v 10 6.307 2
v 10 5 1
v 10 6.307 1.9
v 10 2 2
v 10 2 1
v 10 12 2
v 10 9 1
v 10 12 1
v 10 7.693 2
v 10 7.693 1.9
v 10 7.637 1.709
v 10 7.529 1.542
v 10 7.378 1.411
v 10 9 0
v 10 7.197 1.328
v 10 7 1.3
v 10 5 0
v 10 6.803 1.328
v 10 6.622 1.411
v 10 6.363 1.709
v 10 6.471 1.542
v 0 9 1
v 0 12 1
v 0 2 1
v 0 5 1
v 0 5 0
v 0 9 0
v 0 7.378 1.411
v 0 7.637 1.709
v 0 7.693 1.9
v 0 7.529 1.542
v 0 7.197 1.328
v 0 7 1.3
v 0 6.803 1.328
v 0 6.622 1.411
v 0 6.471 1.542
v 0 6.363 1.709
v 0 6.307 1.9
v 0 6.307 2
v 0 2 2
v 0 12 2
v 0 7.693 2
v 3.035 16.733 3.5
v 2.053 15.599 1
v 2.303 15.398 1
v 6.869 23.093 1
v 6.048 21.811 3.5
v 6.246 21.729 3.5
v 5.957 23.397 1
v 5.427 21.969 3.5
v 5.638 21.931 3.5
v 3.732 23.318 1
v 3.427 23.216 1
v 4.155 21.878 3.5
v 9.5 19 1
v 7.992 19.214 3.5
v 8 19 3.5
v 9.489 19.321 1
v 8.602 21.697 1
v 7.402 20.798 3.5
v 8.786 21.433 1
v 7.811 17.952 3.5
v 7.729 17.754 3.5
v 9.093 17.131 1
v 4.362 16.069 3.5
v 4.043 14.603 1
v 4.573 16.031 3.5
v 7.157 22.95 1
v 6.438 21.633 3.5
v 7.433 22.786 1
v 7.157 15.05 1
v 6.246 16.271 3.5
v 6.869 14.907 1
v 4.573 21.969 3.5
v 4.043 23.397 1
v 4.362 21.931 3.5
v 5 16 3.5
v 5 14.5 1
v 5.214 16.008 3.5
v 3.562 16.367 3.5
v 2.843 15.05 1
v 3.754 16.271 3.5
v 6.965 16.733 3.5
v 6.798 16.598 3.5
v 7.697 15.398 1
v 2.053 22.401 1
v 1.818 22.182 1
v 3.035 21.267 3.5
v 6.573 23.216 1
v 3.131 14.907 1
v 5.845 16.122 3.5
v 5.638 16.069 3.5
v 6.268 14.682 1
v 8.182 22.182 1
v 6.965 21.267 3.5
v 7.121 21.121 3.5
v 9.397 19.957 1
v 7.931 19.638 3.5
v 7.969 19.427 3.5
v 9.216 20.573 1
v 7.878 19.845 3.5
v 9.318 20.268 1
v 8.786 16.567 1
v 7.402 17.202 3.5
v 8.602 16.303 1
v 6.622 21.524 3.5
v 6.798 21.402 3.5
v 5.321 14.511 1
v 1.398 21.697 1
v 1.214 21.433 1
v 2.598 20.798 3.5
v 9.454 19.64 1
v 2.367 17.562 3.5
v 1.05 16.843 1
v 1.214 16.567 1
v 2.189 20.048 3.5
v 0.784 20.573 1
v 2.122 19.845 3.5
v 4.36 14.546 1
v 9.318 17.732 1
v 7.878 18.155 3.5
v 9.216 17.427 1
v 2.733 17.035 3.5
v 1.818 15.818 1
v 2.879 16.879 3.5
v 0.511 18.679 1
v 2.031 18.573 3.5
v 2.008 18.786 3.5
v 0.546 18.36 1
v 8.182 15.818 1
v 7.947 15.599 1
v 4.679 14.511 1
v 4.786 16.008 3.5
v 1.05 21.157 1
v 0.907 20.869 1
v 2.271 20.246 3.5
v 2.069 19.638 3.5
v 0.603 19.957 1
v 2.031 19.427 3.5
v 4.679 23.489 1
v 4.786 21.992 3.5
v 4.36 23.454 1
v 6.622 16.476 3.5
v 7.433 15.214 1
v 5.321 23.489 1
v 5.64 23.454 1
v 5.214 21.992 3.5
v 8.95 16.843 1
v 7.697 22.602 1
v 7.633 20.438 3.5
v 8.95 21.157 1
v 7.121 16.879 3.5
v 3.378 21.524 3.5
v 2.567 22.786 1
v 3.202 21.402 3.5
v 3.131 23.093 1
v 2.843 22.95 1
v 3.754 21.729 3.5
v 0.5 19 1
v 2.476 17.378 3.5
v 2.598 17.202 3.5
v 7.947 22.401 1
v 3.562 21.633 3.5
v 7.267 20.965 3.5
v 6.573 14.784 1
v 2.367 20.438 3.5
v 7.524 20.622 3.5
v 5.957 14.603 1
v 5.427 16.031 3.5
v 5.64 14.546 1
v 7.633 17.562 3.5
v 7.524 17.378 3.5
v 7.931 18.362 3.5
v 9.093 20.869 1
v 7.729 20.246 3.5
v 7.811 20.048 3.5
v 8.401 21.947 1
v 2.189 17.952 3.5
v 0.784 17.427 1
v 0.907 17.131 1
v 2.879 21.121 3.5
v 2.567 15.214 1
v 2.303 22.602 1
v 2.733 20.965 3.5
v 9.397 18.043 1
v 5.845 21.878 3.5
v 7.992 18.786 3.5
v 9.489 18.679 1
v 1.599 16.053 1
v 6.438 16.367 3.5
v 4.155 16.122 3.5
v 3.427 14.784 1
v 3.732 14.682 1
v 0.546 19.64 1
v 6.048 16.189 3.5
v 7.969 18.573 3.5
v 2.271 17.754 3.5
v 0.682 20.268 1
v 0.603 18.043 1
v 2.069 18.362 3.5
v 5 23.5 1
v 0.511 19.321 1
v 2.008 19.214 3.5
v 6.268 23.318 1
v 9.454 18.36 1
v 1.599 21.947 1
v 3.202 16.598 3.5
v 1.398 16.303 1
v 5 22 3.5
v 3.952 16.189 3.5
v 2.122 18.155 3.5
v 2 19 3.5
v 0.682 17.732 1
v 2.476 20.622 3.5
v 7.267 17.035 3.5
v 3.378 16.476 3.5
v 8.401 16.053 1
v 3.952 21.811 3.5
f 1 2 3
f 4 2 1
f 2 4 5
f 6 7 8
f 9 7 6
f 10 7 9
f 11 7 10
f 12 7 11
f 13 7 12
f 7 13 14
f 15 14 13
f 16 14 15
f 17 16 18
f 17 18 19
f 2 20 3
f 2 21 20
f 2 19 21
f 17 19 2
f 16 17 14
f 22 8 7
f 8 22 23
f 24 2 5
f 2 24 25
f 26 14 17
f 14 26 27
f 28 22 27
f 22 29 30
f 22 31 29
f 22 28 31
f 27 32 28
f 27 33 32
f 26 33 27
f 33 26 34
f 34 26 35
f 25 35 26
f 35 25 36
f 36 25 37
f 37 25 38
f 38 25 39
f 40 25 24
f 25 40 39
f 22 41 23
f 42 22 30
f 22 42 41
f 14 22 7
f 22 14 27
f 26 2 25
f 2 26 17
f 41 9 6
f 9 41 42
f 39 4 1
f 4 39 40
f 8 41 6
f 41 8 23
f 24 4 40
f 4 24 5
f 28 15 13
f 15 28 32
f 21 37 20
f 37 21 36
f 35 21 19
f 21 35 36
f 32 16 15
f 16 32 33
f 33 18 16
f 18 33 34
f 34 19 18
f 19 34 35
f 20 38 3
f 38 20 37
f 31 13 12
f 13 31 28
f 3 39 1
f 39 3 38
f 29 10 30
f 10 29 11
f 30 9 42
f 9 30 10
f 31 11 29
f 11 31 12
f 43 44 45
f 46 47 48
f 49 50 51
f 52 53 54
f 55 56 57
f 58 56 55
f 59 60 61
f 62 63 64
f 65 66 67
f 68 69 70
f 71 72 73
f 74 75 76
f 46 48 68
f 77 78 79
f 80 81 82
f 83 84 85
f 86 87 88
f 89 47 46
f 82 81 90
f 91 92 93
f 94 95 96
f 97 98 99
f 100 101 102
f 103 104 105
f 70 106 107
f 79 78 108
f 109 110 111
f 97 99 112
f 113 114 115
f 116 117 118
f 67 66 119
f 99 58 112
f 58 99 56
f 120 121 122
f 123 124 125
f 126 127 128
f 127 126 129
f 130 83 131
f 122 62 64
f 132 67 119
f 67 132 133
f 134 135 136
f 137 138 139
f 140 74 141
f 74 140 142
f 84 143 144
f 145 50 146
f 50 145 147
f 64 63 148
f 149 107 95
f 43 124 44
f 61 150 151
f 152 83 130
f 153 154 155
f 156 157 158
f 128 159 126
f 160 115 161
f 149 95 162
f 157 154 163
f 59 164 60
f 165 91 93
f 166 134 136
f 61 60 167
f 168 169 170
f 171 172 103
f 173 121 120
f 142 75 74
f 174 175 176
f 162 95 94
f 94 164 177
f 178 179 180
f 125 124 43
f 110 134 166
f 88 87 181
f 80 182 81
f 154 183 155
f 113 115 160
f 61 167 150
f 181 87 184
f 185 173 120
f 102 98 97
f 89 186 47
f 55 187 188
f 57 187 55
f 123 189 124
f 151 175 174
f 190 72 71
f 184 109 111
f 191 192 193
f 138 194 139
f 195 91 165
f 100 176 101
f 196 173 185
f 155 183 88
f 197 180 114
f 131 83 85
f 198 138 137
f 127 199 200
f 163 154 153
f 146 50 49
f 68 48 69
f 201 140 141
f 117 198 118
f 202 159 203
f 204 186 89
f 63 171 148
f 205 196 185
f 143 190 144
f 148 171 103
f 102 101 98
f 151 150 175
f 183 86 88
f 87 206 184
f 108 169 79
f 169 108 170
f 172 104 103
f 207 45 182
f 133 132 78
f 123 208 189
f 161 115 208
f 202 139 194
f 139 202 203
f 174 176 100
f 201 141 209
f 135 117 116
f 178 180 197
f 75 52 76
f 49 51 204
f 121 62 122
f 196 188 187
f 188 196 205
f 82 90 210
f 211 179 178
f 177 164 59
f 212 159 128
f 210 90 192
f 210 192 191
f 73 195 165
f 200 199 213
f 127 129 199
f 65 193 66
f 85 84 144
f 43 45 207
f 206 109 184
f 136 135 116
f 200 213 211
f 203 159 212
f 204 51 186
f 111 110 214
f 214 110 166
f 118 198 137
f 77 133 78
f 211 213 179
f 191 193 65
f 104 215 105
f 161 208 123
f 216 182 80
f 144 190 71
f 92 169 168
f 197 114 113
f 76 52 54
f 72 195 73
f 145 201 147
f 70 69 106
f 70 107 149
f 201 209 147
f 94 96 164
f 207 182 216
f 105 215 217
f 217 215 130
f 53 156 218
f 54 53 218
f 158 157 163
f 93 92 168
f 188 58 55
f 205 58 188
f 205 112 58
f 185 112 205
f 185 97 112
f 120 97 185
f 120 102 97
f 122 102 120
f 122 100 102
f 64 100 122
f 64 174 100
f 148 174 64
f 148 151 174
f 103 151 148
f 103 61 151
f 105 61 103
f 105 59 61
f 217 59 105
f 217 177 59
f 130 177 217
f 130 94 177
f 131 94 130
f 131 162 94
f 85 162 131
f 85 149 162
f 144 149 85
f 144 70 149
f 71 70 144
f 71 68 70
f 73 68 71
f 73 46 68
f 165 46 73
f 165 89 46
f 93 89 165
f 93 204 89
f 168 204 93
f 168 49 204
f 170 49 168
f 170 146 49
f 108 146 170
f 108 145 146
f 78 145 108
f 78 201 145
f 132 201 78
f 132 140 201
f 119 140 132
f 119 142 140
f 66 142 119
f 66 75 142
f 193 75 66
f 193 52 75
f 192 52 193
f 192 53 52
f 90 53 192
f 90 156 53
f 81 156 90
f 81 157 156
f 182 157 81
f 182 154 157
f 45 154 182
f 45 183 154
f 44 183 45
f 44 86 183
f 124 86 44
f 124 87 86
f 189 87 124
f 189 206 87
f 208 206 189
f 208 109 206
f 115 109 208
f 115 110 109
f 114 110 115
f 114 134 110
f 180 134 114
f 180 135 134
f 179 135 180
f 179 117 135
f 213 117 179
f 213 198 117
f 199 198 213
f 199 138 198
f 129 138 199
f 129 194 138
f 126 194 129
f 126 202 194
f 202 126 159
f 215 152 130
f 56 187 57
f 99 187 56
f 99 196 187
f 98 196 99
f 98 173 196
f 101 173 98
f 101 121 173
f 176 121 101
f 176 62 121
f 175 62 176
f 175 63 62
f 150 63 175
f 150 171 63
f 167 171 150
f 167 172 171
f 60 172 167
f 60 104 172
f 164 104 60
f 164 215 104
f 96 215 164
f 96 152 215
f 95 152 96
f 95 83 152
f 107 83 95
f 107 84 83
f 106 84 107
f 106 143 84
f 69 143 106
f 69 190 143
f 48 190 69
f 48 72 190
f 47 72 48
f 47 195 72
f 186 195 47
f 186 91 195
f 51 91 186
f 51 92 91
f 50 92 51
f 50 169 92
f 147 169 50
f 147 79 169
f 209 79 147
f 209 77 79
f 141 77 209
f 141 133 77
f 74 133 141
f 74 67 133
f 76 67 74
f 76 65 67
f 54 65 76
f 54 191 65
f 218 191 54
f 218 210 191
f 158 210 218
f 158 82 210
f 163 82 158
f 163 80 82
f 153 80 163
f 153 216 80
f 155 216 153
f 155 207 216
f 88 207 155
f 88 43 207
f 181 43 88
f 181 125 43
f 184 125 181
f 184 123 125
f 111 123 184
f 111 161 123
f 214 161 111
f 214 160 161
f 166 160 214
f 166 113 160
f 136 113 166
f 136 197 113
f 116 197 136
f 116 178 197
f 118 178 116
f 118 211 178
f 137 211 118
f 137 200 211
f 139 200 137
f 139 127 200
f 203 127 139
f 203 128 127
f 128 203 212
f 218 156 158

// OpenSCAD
//=================================================================================
// flextest2.scad
//
// Test gasket, soft foot, live hinge.
// Soft parts are NinjaFlex, stiff parts are PetG
//
// Dr Tom Flint, 13 Dec 2020
//=================================================================================

//-------------------------------------------------------
module test2a(){


// hinge sections
cube([10,5,1]);
translate([0,9,0])
cube([10,5,1]);

translate([0,12,1])
cube([10,2,1]);
translate([0,0,1])
cube([10,2,1]);


// soft foot
difference(){
  translate([0,14,0])
  cube([10,10,2]);

  translate([5,19,1])
  cylinder(r1=4.5,r2=3.0,h=2.5,$fn=88);

  // bolt hole
//  translate([5,19,-1])
//  cylinder(r1=1.5,r2=1.5,h=8,$fn=88);
  
}


}

//-------------------------------------------------------
module test2b(){


// hinge sections
difference(){
  union(){
    translate([0,5,0])
    cube([10,4,1]);
    translate([0,2,1])
    cube([10,10,1]);
  }

  translate([-1,7,2])
  rotate([0,90,0])
  //scale([1,2,1])
  cylinder(r=0.7,h=12,$fn=22);
  
}

// soft foot
difference(){
  translate([5,19,1])
  cylinder(r1=4.5,r2=3.0,h=2.5,$fn=88);

  // bolt hole
//  translate([5,19,0.99])
//  cylinder(r1=1.5,r2=3.5,h=8,$fn=88);
}


}

//=================================================================================

//test2a();

//color("cyan")
test2b();

//=================================================================================
